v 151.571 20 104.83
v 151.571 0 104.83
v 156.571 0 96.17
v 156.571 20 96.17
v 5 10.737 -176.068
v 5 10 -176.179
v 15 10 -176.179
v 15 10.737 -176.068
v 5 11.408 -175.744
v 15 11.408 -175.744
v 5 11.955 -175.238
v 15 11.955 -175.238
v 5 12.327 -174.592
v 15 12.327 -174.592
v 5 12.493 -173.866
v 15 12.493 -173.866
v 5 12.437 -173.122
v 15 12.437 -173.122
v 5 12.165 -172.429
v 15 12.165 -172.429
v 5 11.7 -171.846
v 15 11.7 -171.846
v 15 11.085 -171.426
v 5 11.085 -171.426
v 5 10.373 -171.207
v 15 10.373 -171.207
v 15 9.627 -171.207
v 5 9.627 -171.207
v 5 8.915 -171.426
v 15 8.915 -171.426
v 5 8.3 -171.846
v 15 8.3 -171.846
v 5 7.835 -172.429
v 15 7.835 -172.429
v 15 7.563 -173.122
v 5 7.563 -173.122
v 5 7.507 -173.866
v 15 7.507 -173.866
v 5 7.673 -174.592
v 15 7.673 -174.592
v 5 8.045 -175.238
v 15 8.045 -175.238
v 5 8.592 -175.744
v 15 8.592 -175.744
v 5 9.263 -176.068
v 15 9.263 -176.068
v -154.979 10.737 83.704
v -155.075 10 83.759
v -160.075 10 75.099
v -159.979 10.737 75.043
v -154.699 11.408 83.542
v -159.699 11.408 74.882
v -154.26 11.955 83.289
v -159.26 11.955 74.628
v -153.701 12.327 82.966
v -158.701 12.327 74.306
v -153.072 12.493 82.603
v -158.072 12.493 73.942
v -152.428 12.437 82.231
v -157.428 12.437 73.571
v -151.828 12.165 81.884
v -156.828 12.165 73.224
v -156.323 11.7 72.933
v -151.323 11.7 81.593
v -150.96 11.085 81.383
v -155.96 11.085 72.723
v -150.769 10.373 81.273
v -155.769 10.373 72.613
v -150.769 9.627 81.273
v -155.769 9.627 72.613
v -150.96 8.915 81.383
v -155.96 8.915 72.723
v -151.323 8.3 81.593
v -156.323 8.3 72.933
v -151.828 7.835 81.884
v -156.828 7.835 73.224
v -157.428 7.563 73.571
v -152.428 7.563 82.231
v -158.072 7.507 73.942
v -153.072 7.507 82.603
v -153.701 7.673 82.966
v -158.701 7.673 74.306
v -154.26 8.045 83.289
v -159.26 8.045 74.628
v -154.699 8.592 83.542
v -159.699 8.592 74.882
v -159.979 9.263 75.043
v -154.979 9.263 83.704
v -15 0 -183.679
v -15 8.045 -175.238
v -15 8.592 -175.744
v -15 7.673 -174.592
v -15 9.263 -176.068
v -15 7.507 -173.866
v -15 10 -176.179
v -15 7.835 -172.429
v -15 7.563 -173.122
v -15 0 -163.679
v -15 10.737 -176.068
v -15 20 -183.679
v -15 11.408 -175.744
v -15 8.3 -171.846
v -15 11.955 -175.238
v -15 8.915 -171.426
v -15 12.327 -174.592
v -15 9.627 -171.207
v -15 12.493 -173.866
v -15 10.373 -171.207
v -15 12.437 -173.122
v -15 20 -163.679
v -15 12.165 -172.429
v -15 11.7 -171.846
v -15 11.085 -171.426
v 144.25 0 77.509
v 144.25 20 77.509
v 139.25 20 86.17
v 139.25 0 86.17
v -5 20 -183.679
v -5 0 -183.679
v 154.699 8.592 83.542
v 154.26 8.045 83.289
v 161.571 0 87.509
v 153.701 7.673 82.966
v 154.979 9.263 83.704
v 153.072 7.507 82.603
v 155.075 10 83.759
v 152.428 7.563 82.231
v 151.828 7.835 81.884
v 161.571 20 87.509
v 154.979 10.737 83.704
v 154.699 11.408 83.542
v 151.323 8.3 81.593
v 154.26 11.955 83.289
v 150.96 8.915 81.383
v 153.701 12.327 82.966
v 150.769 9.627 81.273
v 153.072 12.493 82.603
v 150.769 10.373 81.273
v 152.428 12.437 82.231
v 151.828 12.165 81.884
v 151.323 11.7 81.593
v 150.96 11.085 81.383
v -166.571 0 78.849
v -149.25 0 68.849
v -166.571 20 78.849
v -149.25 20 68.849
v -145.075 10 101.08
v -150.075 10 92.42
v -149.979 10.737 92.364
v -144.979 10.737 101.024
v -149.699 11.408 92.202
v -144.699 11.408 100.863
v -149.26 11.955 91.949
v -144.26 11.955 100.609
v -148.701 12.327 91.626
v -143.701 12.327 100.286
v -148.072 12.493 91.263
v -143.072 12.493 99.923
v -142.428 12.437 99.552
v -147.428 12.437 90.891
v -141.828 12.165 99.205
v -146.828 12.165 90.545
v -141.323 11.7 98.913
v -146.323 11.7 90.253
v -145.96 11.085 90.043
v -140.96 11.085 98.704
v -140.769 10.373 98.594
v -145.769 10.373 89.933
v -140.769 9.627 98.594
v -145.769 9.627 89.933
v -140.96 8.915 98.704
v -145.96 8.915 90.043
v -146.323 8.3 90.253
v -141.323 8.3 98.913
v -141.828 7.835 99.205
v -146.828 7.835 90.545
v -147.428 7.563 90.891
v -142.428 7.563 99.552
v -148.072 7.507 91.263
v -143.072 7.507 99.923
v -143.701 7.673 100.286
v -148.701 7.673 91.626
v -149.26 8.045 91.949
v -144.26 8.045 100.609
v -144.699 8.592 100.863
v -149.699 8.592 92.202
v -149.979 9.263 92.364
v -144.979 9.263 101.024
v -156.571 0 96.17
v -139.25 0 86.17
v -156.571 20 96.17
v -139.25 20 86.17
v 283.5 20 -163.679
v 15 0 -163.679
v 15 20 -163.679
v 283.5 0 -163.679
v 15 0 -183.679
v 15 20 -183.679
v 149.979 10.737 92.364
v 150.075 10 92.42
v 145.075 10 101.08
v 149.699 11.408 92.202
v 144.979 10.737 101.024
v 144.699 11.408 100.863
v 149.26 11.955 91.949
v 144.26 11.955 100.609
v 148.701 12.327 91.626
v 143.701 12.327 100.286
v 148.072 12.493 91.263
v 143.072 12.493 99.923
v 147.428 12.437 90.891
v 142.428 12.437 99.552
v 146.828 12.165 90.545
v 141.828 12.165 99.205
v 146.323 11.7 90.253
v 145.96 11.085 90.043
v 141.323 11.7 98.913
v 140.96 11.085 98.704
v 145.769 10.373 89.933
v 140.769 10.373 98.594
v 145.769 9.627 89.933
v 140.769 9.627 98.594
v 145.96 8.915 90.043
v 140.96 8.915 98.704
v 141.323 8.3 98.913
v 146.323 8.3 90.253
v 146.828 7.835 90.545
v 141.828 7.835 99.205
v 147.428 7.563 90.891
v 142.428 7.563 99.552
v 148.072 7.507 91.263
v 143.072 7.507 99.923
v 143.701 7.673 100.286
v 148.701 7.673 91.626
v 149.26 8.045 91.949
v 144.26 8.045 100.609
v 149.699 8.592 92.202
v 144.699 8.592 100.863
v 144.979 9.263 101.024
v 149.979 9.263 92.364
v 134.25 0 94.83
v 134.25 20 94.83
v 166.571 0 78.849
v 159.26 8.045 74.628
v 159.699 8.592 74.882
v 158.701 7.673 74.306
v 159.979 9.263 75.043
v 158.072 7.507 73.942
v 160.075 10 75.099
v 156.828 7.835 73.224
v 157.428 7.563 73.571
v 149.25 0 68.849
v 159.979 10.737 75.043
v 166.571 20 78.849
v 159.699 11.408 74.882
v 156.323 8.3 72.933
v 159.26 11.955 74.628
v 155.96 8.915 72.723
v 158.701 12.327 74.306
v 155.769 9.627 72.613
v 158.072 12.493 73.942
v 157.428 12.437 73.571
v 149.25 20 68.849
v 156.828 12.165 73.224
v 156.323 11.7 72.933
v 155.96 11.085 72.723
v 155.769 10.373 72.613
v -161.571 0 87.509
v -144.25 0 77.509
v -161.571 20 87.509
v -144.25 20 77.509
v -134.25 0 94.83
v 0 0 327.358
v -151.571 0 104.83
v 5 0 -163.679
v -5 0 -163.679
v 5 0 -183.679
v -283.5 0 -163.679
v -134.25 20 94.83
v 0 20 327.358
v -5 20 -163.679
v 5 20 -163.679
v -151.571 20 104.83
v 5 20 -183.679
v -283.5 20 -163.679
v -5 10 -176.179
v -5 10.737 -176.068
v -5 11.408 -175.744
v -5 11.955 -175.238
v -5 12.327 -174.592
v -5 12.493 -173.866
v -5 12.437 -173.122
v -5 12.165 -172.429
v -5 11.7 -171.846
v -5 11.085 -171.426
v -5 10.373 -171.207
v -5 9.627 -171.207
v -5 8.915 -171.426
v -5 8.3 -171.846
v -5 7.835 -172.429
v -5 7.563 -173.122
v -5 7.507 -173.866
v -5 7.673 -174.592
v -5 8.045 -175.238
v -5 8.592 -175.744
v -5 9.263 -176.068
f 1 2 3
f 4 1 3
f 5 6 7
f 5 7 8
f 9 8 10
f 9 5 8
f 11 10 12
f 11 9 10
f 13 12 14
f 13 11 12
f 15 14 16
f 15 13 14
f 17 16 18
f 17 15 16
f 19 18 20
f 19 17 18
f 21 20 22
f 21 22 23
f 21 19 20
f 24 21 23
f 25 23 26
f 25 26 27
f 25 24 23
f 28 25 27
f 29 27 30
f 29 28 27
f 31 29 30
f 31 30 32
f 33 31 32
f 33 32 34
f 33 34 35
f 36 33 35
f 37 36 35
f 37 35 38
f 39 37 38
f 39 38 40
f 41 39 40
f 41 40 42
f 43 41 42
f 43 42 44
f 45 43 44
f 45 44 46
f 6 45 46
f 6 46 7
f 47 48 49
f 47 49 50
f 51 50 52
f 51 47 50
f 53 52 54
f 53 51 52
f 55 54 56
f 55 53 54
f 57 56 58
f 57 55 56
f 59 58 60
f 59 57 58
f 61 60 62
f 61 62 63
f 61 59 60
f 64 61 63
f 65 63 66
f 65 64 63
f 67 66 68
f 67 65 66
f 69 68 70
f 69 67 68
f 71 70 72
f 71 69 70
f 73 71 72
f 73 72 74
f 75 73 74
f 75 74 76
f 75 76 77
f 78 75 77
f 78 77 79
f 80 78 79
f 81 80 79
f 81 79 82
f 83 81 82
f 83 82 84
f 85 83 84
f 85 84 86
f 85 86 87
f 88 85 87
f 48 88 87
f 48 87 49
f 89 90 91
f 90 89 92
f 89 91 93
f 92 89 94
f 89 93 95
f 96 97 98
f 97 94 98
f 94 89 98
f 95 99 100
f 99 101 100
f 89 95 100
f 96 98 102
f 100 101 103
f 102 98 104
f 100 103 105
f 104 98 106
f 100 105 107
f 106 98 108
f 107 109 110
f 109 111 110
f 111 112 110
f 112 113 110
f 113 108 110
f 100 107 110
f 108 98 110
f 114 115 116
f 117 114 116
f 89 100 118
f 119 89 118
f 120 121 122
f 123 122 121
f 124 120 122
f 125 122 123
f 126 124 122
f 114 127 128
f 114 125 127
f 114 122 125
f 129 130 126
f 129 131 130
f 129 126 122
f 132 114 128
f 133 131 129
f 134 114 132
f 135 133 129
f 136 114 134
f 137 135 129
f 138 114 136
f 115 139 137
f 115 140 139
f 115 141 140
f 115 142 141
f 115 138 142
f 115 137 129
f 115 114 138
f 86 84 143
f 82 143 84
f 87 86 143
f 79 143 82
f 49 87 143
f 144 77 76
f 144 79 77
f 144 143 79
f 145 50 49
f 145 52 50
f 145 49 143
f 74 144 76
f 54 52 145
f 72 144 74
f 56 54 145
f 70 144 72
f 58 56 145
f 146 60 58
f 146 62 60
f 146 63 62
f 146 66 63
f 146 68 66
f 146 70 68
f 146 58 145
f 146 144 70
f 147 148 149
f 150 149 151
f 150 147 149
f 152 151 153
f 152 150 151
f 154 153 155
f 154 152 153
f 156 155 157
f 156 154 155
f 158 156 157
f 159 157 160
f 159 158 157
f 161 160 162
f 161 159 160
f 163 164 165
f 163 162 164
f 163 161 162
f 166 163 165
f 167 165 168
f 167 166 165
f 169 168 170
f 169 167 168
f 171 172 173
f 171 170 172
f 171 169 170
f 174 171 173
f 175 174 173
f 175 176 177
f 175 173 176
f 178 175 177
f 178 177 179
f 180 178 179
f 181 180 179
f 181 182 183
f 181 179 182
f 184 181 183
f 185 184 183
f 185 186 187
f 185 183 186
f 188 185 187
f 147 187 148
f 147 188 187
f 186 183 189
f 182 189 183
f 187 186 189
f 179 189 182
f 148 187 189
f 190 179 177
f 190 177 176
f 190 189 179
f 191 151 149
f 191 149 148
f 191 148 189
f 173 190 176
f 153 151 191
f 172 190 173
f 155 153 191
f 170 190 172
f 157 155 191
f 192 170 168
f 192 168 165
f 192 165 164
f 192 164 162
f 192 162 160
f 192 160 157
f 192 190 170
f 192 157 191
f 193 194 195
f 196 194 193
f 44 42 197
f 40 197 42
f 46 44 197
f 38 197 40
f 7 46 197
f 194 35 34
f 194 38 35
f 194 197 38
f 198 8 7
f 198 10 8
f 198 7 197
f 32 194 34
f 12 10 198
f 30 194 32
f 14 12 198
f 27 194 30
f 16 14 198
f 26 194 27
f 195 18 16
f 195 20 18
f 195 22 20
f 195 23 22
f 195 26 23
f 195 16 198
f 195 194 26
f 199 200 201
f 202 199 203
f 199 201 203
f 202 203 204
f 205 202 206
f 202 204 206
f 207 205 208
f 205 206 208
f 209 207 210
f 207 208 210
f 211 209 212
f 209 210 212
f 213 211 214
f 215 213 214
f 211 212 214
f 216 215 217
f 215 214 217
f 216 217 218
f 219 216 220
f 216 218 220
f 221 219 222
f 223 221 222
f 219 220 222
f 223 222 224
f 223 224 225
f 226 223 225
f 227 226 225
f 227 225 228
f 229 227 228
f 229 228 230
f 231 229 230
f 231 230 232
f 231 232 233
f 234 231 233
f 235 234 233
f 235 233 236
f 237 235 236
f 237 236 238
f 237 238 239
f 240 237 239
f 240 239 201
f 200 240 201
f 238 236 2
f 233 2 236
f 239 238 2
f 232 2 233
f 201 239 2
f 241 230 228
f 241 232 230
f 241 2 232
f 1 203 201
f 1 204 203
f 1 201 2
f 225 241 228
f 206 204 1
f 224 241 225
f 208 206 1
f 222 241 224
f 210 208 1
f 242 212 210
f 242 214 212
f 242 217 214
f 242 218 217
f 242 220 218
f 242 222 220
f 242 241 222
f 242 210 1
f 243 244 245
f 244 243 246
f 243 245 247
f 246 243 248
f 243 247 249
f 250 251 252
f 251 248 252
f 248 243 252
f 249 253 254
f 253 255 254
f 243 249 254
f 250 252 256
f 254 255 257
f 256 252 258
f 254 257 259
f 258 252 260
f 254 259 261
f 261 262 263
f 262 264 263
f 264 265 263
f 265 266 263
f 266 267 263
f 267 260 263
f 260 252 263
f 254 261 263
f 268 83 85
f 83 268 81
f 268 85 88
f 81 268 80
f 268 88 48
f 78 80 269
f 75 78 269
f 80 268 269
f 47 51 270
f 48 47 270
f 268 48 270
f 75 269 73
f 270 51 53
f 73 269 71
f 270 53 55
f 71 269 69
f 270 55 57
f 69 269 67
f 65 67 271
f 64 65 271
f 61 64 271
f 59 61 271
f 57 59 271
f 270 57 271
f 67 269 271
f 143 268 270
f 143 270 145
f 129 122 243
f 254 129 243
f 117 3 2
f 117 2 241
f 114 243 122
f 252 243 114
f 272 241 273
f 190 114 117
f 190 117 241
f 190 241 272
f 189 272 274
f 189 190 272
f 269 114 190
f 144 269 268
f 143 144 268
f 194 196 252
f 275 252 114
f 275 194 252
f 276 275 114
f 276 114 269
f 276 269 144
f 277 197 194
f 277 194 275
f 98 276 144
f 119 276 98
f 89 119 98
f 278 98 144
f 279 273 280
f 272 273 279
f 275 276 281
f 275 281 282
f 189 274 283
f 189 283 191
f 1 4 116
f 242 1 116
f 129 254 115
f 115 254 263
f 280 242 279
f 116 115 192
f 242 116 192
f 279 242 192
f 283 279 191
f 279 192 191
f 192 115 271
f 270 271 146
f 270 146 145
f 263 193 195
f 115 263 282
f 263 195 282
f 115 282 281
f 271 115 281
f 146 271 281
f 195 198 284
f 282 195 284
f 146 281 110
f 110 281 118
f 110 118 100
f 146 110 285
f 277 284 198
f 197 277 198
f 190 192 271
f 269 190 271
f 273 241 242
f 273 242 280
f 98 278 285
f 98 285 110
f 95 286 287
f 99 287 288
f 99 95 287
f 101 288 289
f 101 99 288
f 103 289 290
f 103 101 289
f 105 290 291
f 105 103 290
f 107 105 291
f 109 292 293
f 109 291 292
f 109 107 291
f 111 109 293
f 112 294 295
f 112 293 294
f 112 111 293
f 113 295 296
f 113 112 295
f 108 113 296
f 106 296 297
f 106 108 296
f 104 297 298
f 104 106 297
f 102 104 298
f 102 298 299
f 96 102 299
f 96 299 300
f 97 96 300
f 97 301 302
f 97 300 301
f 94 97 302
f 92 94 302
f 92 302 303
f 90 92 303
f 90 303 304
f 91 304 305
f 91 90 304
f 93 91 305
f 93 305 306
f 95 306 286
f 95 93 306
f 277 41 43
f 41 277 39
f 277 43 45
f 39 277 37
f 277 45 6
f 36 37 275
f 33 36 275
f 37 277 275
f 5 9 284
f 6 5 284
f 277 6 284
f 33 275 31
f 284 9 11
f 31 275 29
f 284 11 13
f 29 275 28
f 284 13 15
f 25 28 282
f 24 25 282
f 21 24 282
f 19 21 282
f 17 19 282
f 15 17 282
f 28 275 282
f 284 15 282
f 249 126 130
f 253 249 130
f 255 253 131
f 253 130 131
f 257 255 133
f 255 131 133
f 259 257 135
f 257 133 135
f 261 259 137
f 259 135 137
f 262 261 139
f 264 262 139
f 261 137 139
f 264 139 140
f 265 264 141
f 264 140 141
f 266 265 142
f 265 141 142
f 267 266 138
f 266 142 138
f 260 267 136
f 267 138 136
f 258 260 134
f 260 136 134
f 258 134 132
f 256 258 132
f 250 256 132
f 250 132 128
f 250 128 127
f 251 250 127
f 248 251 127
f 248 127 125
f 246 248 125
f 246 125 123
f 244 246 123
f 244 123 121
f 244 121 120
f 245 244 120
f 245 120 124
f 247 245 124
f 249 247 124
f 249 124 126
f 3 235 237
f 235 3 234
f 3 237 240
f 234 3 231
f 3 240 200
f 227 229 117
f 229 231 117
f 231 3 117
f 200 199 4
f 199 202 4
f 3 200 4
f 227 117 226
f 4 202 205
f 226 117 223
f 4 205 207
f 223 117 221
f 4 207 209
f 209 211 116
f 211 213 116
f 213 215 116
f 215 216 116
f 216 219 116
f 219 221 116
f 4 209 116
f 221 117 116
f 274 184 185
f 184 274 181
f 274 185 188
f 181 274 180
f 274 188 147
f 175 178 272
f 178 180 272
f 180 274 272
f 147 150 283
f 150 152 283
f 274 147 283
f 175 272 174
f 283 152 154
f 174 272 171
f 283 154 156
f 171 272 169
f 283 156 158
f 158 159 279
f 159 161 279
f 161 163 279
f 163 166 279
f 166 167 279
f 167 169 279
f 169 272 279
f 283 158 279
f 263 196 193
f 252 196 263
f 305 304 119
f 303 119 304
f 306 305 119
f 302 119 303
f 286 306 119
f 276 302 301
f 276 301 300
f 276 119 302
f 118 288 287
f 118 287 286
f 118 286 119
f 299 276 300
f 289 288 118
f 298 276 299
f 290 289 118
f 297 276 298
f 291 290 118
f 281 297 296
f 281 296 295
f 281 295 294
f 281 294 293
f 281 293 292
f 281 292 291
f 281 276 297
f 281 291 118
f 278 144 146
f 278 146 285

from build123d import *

# Parameters (mm, degrees)
BOSS_EXTRUDE1_DEPTH = 20
SKETCH3_W           = 10
SKETCH3_H           = 20
BOSS_EXTRUDE2_DEPTH = 20
SKETCH4_R           = 2.5
CUT_EXTRUDE1_DEPTH  = 30


with BuildPart() as part:
    # Sketch2 → Boss-Extrude1 (new body)
    with BuildSketch(Plane(origin=(0, 0, 0), x_dir=(1, 0, 0), z_dir=(0, 1, 0))):
        Polygon((-283.5, 163.678801315), (283.5, 163.678801315), (0, -327.357602631), align=None)
    extrude(amount=BOSS_EXTRUDE1_DEPTH)

    # Sketch3 → Boss-Extrude2 (add)
    with BuildSketch(Plane(origin=(141.75, 0, 81.839400658), x_dir=(0.5, 0, -0.866025404), z_dir=(0.866025404, 0, 0.5))):
        with Locations((-10, 10)):
            Rectangle(SKETCH3_W, SKETCH3_H)
        with Locations((10, 10)):
            Rectangle(SKETCH3_W, SKETCH3_H)
    boss_extrude2 = extrude(amount=BOSS_EXTRUDE2_DEPTH)

    # Sketch4 → Cut-Extrude1 (cut)
    with BuildSketch(Plane(origin=(-7.5, 0, 12.990381057), x_dir=(0.866025404, 0, 0.5), z_dir=(-0.5, 0, 0.866025404))):
        with Locations((173.678801315, 10)):
            Circle(SKETCH4_R)
    cut_extrude1 = extrude(amount=-CUT_EXTRUDE1_DEPTH, mode=Mode.SUBTRACT)

    # Mirror1: Boss-Extrude2, Cut-Extrude1 across plane
    add(boss_extrude2.mirror(Plane(origin=(0, 0, 0), x_dir=(-0.866025404, 0, 0.5), z_dir=(0.5, 0, 0.866025404))))
    add(cut_extrude1.mirror(Plane(origin=(0, 0, 0), x_dir=(-0.866025404, 0, 0.5), z_dir=(0.5, 0, 0.866025404))), mode=Mode.SUBTRACT)

    # Mirror1 at the second plane: Boss-Extrude2, Cut-Extrude1 across plane
    add(boss_extrude2.mirror(Plane(origin=(0, 0, 0), x_dir=(0, 0, 1), z_dir=(1, 0, 0))))
    add(cut_extrude1.mirror(Plane(origin=(0, 0, 0), x_dir=(0, 0, 1), z_dir=(1, 0, 0))), mode=Mode.SUBTRACT)


solid = part.part
